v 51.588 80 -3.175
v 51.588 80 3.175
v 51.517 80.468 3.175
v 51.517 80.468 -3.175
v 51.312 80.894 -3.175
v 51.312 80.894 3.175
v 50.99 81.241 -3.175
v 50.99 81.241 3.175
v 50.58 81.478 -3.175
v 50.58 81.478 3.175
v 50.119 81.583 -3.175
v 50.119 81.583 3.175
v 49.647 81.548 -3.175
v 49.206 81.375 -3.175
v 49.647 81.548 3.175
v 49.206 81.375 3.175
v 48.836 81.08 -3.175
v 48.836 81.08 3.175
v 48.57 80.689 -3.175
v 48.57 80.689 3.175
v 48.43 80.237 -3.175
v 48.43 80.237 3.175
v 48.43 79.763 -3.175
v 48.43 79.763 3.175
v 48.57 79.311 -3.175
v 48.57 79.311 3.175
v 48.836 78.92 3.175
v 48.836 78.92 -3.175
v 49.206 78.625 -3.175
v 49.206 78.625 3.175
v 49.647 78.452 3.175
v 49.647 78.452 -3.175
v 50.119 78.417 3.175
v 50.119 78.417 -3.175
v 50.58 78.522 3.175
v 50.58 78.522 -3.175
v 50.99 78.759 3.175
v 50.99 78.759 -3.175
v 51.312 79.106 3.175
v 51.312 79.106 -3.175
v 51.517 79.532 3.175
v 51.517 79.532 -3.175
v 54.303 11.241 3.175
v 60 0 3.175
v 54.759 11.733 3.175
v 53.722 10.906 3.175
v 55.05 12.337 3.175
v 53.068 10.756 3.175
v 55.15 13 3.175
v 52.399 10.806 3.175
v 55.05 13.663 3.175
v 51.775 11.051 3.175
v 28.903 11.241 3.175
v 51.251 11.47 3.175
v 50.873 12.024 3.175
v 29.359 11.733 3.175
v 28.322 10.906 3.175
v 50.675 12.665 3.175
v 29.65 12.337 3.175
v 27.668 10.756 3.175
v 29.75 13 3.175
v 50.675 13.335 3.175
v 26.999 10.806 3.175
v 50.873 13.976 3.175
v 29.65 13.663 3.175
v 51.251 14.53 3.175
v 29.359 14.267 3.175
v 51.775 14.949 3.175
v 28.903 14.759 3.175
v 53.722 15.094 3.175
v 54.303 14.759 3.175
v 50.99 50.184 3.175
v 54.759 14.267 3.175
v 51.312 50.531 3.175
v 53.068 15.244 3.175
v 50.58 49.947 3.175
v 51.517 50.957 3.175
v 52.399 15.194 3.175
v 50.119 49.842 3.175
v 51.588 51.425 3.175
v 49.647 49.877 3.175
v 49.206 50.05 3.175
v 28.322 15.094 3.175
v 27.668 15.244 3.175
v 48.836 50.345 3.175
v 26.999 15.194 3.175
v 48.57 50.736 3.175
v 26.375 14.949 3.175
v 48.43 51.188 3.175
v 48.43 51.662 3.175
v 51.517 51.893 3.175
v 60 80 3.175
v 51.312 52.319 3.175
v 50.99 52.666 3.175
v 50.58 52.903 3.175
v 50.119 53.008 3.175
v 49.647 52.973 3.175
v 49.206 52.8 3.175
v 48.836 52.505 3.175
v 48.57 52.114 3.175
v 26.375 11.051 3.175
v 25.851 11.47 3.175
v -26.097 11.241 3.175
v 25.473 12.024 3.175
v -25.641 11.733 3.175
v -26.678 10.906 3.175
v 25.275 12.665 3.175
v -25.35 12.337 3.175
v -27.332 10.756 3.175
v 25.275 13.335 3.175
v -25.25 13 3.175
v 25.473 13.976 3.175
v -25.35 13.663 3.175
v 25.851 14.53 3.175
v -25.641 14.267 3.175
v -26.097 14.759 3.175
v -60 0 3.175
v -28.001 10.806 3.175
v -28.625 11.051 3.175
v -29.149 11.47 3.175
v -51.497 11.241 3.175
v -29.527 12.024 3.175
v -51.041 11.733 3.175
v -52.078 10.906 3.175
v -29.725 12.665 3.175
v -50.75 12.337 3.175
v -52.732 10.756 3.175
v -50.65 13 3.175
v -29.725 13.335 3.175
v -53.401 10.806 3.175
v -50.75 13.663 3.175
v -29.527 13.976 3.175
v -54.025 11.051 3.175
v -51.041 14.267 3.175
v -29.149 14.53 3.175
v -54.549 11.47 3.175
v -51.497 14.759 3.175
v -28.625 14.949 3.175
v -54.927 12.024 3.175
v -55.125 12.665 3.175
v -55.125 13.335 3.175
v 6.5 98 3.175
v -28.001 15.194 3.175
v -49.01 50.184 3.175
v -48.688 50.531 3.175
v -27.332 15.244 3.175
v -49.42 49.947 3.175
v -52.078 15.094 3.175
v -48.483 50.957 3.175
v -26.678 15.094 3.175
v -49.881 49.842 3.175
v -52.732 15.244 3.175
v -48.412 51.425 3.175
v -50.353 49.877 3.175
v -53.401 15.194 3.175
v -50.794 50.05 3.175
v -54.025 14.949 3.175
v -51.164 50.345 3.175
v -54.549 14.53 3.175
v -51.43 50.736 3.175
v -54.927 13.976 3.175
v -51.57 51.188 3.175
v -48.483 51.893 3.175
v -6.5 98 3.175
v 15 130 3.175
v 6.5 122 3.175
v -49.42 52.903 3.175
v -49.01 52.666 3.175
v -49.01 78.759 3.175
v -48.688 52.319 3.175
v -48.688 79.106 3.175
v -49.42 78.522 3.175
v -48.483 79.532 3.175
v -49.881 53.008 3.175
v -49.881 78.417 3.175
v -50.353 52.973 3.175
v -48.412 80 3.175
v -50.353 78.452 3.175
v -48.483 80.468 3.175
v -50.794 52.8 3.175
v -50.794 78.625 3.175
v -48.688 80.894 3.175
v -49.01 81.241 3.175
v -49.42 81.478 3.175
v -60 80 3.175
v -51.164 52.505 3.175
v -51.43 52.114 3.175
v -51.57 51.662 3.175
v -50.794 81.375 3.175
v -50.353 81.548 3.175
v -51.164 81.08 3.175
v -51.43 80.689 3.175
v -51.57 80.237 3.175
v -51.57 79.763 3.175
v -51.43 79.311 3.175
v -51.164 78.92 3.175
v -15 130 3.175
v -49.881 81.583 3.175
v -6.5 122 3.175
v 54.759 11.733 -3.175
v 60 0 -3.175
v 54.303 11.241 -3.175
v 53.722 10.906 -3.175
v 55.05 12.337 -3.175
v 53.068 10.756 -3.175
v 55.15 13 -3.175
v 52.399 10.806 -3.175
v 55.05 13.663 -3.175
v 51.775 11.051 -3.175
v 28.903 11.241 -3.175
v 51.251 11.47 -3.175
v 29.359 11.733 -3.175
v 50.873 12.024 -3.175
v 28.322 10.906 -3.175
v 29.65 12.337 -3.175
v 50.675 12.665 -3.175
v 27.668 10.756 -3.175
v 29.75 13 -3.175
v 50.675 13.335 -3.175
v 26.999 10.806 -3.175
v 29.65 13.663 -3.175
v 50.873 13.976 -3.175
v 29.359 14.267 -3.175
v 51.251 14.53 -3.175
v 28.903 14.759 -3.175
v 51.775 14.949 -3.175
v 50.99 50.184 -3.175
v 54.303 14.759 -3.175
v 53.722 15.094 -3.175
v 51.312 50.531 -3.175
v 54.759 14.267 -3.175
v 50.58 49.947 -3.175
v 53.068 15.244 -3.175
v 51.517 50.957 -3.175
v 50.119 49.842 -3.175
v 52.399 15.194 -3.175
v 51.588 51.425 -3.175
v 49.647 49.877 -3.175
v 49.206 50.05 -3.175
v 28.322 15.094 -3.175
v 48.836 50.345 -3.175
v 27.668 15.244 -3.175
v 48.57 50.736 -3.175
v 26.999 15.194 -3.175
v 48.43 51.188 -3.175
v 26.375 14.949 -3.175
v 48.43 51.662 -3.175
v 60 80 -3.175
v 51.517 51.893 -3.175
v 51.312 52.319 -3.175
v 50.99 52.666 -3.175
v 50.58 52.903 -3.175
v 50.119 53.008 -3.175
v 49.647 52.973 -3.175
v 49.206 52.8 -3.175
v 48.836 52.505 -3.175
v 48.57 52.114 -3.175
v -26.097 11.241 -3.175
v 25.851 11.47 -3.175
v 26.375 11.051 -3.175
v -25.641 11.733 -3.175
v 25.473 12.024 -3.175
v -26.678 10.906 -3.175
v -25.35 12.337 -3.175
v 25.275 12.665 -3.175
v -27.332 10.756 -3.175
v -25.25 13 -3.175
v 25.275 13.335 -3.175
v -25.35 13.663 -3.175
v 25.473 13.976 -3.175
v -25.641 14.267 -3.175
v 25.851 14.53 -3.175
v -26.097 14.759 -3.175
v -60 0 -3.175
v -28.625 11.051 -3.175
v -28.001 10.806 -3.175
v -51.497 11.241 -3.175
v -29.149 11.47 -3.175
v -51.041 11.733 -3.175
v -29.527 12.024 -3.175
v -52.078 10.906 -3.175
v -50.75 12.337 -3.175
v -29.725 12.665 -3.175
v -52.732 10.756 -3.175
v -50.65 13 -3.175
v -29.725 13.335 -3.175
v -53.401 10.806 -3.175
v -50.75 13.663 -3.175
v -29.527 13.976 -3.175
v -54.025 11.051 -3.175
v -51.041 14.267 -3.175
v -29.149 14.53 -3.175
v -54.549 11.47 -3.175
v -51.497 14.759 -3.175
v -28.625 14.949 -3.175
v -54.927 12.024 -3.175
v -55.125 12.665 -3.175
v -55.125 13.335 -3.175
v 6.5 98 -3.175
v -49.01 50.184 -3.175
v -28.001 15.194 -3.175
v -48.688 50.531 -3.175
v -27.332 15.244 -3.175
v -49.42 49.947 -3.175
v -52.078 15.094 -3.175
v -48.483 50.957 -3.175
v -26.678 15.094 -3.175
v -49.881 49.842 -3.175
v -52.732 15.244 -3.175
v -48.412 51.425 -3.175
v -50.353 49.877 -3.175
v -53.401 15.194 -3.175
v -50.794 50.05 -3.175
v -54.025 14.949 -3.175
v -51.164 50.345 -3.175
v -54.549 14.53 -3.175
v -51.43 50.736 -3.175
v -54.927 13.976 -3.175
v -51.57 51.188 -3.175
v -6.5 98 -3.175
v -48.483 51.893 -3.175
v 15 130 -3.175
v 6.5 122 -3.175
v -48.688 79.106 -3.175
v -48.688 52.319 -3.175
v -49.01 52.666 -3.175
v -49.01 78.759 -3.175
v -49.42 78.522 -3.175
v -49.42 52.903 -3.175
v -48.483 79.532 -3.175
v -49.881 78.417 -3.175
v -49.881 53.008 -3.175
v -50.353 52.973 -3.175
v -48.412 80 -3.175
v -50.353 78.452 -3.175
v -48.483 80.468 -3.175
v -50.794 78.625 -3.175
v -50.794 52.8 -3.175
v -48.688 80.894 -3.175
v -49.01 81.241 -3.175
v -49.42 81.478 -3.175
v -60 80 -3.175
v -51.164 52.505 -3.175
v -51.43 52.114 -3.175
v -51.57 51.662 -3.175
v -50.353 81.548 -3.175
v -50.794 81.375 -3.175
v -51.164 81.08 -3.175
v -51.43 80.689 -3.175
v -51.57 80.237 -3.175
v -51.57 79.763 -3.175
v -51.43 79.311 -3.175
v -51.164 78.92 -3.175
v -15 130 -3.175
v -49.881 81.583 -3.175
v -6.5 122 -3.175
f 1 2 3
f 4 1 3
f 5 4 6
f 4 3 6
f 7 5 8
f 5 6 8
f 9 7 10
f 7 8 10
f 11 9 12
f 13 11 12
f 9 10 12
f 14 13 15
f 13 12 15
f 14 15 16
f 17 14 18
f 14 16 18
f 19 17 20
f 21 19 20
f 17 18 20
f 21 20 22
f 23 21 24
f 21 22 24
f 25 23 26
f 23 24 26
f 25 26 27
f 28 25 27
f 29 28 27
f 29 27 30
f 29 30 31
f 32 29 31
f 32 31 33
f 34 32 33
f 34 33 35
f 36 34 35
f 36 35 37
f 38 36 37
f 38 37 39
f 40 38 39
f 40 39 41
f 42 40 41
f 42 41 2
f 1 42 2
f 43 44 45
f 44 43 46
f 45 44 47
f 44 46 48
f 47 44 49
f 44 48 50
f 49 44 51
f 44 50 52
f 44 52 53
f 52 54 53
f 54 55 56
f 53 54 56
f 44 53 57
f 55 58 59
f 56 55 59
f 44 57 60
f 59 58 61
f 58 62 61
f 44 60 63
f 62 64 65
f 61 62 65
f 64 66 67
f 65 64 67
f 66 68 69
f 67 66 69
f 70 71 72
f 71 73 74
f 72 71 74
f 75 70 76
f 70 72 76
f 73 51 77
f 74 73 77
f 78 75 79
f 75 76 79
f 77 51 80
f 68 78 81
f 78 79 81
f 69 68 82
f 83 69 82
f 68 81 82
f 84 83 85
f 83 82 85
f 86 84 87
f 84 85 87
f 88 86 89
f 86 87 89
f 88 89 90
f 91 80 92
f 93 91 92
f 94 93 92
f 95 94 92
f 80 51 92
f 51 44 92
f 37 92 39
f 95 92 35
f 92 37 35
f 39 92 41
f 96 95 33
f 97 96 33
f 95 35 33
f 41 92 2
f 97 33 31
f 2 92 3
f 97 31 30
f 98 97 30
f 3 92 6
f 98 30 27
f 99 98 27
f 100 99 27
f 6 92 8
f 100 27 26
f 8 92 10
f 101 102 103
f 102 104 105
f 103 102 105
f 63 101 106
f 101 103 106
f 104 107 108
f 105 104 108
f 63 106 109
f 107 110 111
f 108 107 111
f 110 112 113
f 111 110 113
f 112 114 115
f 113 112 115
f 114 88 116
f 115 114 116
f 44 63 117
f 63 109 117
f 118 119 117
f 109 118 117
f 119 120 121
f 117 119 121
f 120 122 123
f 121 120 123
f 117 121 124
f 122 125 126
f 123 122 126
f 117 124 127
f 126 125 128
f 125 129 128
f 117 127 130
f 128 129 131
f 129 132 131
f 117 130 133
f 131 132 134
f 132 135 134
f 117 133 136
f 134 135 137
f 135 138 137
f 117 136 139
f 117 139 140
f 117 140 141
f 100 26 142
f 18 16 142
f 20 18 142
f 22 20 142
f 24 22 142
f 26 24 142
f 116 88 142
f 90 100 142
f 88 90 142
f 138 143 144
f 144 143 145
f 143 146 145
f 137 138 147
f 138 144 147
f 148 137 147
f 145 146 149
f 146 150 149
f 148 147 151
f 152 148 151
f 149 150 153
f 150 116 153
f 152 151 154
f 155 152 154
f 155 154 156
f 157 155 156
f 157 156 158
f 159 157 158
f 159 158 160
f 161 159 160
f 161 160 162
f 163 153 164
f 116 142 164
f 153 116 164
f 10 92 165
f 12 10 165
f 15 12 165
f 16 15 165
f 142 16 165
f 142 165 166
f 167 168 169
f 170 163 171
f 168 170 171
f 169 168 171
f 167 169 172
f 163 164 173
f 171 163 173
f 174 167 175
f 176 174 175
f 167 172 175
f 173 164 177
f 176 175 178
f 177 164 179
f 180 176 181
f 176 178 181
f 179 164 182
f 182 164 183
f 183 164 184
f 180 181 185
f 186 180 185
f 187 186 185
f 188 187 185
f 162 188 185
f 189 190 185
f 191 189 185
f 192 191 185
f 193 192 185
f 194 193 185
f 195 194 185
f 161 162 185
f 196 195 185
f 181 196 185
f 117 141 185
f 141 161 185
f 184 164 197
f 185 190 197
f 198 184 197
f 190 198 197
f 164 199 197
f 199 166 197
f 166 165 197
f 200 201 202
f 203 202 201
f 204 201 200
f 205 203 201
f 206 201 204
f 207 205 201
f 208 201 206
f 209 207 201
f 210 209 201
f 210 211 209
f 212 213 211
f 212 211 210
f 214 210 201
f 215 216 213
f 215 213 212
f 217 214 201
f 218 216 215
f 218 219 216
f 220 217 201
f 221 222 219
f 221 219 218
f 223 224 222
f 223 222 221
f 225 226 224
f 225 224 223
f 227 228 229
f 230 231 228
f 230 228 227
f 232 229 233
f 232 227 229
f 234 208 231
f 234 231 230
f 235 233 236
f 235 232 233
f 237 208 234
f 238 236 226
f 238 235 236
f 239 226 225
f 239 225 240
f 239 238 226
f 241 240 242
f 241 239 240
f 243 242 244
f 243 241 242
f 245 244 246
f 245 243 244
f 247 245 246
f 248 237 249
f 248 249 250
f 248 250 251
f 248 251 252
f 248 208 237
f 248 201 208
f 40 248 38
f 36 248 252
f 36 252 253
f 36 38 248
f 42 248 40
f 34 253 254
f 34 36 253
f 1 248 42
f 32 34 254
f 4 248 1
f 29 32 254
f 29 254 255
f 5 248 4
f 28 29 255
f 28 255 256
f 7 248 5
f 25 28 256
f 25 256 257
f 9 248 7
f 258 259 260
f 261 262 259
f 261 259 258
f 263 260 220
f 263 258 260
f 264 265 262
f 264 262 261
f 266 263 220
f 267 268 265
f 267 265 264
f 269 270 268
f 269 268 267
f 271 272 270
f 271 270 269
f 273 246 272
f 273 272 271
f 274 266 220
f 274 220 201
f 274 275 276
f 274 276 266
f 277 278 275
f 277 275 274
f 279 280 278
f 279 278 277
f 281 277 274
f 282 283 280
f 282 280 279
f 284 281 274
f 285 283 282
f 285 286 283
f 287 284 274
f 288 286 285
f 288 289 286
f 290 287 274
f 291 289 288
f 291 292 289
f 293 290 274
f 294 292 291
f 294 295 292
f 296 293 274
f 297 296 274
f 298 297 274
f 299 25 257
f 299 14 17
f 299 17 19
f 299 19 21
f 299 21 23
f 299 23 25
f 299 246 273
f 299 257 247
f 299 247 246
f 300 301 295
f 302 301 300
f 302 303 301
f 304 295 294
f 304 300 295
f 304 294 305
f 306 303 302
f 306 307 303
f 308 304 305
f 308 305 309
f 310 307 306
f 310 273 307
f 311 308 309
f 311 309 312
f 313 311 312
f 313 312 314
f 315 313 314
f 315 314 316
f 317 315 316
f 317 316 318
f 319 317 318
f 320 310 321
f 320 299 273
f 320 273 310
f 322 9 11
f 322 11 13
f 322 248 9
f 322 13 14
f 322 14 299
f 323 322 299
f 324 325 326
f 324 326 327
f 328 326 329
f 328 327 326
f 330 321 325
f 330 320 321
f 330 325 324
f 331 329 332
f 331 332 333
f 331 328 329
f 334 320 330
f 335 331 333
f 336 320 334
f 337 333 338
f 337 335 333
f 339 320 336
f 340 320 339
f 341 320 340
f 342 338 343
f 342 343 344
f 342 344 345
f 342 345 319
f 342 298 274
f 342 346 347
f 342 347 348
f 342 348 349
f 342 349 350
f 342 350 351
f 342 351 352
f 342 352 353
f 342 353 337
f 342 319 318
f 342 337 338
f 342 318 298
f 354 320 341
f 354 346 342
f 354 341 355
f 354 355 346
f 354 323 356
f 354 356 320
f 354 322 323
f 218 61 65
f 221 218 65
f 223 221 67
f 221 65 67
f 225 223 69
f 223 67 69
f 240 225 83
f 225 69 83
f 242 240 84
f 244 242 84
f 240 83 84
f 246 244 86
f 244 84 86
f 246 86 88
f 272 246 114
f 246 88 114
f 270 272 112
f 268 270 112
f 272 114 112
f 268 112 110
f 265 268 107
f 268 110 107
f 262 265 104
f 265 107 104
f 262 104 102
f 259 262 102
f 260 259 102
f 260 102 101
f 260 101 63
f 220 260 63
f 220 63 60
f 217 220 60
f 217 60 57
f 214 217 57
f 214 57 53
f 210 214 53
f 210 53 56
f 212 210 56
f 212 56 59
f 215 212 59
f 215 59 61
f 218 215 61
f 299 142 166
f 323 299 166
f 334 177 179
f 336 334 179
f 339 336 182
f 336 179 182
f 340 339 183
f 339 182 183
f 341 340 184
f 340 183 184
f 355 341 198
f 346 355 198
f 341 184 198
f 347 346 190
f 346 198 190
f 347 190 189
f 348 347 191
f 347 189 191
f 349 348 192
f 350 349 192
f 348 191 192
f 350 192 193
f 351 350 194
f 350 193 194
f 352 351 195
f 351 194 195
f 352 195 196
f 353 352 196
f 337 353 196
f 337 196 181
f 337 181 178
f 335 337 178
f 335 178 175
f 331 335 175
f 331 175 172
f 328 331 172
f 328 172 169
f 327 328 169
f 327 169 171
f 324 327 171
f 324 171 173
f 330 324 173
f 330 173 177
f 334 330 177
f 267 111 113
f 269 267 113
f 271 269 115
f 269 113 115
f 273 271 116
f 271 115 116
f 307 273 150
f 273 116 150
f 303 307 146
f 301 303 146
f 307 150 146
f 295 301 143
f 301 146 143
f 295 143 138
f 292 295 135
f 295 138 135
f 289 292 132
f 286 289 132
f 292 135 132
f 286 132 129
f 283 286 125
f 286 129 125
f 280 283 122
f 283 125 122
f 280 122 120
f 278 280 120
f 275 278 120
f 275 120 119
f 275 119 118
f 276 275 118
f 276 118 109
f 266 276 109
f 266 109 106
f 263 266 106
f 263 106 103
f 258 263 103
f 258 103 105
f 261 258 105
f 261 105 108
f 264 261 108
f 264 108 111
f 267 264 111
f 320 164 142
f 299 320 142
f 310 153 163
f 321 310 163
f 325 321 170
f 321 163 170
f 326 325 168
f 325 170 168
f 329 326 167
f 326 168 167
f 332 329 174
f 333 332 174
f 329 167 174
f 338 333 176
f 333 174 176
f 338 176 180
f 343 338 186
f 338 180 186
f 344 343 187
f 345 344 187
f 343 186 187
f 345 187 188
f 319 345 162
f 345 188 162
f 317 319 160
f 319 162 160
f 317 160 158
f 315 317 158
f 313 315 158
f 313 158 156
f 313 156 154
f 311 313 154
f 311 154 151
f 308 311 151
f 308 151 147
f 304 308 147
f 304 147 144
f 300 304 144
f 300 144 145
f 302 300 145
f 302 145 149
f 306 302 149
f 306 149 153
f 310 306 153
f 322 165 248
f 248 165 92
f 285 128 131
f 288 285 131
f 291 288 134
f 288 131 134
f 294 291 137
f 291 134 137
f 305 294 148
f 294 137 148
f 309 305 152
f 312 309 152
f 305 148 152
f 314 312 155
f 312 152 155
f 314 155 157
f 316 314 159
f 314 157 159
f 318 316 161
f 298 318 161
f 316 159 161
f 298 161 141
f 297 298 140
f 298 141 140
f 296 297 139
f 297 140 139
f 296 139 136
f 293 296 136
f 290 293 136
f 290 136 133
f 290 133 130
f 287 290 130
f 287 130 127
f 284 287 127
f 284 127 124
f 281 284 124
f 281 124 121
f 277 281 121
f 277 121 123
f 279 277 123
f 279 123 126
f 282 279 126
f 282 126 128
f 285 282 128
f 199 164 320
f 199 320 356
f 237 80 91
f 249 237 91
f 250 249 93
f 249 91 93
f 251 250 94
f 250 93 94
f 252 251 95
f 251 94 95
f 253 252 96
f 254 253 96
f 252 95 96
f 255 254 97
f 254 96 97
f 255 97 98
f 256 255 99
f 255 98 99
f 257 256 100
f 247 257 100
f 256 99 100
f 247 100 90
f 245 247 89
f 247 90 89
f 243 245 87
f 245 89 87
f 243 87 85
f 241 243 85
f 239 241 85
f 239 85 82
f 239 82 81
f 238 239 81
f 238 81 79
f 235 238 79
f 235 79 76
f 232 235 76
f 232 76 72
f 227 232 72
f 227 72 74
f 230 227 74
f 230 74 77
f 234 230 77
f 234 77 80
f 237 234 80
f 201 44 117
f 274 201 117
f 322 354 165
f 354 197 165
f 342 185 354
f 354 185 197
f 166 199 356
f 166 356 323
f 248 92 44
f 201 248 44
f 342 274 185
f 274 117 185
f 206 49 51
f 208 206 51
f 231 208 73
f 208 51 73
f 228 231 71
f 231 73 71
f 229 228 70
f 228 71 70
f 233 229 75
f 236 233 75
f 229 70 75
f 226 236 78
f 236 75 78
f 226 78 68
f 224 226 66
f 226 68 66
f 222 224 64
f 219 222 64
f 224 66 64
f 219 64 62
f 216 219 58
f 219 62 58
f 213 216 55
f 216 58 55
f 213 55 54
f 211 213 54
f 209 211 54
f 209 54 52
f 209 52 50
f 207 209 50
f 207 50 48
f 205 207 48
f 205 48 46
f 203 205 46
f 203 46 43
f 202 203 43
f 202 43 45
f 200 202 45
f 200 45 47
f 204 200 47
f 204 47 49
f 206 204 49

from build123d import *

# Parameters (mm, degrees)
BOSS_EXTRUDE1_DEPTH = 3.175
SKETCH3_R           = 2.25
SKETCH3_R_2         = 1.5875
SKETCH3_W           = 13
SKETCH3_H           = 24
CUT_EXTRUDE1_DEPTH  = 7.35


with BuildPart() as part:
    # Sketch1 → Boss-Extrude1 (new body, symmetric)
    with BuildSketch(Plane.XY):
        Polygon((60, 0), (-60, 0), (-60, 80), (-15, 130), (15, 130), (60, 80), align=None)
    extrude(amount=BOSS_EXTRUDE1_DEPTH, both=True)

    # Sketch3 → Cut-Extrude1 (cut, through all)
    with BuildSketch(Plane.XY.offset(3.175)):
        with Locations((-52.9, 13)):
            Circle(SKETCH3_R)
        with Locations((-27.5, 13)):
            Circle(SKETCH3_R)
        with Locations((27.5, 13)):
            Circle(SKETCH3_R)
        with Locations((52.9, 13)):
            Circle(SKETCH3_R)
        with Locations((-50, 80)):
            Circle(SKETCH3_R_2)
        with Locations((-50, 51.425)):
            Circle(SKETCH3_R_2)
        with Locations((50, 51.425)):
            Circle(SKETCH3_R_2)
        with Locations((50, 80)):
            Circle(SKETCH3_R_2)
        with Locations((0, 110)):
            Rectangle(SKETCH3_W, SKETCH3_H)
    extrude(amount=-CUT_EXTRUDE1_DEPTH, mode=Mode.SUBTRACT)


solid = part.part
